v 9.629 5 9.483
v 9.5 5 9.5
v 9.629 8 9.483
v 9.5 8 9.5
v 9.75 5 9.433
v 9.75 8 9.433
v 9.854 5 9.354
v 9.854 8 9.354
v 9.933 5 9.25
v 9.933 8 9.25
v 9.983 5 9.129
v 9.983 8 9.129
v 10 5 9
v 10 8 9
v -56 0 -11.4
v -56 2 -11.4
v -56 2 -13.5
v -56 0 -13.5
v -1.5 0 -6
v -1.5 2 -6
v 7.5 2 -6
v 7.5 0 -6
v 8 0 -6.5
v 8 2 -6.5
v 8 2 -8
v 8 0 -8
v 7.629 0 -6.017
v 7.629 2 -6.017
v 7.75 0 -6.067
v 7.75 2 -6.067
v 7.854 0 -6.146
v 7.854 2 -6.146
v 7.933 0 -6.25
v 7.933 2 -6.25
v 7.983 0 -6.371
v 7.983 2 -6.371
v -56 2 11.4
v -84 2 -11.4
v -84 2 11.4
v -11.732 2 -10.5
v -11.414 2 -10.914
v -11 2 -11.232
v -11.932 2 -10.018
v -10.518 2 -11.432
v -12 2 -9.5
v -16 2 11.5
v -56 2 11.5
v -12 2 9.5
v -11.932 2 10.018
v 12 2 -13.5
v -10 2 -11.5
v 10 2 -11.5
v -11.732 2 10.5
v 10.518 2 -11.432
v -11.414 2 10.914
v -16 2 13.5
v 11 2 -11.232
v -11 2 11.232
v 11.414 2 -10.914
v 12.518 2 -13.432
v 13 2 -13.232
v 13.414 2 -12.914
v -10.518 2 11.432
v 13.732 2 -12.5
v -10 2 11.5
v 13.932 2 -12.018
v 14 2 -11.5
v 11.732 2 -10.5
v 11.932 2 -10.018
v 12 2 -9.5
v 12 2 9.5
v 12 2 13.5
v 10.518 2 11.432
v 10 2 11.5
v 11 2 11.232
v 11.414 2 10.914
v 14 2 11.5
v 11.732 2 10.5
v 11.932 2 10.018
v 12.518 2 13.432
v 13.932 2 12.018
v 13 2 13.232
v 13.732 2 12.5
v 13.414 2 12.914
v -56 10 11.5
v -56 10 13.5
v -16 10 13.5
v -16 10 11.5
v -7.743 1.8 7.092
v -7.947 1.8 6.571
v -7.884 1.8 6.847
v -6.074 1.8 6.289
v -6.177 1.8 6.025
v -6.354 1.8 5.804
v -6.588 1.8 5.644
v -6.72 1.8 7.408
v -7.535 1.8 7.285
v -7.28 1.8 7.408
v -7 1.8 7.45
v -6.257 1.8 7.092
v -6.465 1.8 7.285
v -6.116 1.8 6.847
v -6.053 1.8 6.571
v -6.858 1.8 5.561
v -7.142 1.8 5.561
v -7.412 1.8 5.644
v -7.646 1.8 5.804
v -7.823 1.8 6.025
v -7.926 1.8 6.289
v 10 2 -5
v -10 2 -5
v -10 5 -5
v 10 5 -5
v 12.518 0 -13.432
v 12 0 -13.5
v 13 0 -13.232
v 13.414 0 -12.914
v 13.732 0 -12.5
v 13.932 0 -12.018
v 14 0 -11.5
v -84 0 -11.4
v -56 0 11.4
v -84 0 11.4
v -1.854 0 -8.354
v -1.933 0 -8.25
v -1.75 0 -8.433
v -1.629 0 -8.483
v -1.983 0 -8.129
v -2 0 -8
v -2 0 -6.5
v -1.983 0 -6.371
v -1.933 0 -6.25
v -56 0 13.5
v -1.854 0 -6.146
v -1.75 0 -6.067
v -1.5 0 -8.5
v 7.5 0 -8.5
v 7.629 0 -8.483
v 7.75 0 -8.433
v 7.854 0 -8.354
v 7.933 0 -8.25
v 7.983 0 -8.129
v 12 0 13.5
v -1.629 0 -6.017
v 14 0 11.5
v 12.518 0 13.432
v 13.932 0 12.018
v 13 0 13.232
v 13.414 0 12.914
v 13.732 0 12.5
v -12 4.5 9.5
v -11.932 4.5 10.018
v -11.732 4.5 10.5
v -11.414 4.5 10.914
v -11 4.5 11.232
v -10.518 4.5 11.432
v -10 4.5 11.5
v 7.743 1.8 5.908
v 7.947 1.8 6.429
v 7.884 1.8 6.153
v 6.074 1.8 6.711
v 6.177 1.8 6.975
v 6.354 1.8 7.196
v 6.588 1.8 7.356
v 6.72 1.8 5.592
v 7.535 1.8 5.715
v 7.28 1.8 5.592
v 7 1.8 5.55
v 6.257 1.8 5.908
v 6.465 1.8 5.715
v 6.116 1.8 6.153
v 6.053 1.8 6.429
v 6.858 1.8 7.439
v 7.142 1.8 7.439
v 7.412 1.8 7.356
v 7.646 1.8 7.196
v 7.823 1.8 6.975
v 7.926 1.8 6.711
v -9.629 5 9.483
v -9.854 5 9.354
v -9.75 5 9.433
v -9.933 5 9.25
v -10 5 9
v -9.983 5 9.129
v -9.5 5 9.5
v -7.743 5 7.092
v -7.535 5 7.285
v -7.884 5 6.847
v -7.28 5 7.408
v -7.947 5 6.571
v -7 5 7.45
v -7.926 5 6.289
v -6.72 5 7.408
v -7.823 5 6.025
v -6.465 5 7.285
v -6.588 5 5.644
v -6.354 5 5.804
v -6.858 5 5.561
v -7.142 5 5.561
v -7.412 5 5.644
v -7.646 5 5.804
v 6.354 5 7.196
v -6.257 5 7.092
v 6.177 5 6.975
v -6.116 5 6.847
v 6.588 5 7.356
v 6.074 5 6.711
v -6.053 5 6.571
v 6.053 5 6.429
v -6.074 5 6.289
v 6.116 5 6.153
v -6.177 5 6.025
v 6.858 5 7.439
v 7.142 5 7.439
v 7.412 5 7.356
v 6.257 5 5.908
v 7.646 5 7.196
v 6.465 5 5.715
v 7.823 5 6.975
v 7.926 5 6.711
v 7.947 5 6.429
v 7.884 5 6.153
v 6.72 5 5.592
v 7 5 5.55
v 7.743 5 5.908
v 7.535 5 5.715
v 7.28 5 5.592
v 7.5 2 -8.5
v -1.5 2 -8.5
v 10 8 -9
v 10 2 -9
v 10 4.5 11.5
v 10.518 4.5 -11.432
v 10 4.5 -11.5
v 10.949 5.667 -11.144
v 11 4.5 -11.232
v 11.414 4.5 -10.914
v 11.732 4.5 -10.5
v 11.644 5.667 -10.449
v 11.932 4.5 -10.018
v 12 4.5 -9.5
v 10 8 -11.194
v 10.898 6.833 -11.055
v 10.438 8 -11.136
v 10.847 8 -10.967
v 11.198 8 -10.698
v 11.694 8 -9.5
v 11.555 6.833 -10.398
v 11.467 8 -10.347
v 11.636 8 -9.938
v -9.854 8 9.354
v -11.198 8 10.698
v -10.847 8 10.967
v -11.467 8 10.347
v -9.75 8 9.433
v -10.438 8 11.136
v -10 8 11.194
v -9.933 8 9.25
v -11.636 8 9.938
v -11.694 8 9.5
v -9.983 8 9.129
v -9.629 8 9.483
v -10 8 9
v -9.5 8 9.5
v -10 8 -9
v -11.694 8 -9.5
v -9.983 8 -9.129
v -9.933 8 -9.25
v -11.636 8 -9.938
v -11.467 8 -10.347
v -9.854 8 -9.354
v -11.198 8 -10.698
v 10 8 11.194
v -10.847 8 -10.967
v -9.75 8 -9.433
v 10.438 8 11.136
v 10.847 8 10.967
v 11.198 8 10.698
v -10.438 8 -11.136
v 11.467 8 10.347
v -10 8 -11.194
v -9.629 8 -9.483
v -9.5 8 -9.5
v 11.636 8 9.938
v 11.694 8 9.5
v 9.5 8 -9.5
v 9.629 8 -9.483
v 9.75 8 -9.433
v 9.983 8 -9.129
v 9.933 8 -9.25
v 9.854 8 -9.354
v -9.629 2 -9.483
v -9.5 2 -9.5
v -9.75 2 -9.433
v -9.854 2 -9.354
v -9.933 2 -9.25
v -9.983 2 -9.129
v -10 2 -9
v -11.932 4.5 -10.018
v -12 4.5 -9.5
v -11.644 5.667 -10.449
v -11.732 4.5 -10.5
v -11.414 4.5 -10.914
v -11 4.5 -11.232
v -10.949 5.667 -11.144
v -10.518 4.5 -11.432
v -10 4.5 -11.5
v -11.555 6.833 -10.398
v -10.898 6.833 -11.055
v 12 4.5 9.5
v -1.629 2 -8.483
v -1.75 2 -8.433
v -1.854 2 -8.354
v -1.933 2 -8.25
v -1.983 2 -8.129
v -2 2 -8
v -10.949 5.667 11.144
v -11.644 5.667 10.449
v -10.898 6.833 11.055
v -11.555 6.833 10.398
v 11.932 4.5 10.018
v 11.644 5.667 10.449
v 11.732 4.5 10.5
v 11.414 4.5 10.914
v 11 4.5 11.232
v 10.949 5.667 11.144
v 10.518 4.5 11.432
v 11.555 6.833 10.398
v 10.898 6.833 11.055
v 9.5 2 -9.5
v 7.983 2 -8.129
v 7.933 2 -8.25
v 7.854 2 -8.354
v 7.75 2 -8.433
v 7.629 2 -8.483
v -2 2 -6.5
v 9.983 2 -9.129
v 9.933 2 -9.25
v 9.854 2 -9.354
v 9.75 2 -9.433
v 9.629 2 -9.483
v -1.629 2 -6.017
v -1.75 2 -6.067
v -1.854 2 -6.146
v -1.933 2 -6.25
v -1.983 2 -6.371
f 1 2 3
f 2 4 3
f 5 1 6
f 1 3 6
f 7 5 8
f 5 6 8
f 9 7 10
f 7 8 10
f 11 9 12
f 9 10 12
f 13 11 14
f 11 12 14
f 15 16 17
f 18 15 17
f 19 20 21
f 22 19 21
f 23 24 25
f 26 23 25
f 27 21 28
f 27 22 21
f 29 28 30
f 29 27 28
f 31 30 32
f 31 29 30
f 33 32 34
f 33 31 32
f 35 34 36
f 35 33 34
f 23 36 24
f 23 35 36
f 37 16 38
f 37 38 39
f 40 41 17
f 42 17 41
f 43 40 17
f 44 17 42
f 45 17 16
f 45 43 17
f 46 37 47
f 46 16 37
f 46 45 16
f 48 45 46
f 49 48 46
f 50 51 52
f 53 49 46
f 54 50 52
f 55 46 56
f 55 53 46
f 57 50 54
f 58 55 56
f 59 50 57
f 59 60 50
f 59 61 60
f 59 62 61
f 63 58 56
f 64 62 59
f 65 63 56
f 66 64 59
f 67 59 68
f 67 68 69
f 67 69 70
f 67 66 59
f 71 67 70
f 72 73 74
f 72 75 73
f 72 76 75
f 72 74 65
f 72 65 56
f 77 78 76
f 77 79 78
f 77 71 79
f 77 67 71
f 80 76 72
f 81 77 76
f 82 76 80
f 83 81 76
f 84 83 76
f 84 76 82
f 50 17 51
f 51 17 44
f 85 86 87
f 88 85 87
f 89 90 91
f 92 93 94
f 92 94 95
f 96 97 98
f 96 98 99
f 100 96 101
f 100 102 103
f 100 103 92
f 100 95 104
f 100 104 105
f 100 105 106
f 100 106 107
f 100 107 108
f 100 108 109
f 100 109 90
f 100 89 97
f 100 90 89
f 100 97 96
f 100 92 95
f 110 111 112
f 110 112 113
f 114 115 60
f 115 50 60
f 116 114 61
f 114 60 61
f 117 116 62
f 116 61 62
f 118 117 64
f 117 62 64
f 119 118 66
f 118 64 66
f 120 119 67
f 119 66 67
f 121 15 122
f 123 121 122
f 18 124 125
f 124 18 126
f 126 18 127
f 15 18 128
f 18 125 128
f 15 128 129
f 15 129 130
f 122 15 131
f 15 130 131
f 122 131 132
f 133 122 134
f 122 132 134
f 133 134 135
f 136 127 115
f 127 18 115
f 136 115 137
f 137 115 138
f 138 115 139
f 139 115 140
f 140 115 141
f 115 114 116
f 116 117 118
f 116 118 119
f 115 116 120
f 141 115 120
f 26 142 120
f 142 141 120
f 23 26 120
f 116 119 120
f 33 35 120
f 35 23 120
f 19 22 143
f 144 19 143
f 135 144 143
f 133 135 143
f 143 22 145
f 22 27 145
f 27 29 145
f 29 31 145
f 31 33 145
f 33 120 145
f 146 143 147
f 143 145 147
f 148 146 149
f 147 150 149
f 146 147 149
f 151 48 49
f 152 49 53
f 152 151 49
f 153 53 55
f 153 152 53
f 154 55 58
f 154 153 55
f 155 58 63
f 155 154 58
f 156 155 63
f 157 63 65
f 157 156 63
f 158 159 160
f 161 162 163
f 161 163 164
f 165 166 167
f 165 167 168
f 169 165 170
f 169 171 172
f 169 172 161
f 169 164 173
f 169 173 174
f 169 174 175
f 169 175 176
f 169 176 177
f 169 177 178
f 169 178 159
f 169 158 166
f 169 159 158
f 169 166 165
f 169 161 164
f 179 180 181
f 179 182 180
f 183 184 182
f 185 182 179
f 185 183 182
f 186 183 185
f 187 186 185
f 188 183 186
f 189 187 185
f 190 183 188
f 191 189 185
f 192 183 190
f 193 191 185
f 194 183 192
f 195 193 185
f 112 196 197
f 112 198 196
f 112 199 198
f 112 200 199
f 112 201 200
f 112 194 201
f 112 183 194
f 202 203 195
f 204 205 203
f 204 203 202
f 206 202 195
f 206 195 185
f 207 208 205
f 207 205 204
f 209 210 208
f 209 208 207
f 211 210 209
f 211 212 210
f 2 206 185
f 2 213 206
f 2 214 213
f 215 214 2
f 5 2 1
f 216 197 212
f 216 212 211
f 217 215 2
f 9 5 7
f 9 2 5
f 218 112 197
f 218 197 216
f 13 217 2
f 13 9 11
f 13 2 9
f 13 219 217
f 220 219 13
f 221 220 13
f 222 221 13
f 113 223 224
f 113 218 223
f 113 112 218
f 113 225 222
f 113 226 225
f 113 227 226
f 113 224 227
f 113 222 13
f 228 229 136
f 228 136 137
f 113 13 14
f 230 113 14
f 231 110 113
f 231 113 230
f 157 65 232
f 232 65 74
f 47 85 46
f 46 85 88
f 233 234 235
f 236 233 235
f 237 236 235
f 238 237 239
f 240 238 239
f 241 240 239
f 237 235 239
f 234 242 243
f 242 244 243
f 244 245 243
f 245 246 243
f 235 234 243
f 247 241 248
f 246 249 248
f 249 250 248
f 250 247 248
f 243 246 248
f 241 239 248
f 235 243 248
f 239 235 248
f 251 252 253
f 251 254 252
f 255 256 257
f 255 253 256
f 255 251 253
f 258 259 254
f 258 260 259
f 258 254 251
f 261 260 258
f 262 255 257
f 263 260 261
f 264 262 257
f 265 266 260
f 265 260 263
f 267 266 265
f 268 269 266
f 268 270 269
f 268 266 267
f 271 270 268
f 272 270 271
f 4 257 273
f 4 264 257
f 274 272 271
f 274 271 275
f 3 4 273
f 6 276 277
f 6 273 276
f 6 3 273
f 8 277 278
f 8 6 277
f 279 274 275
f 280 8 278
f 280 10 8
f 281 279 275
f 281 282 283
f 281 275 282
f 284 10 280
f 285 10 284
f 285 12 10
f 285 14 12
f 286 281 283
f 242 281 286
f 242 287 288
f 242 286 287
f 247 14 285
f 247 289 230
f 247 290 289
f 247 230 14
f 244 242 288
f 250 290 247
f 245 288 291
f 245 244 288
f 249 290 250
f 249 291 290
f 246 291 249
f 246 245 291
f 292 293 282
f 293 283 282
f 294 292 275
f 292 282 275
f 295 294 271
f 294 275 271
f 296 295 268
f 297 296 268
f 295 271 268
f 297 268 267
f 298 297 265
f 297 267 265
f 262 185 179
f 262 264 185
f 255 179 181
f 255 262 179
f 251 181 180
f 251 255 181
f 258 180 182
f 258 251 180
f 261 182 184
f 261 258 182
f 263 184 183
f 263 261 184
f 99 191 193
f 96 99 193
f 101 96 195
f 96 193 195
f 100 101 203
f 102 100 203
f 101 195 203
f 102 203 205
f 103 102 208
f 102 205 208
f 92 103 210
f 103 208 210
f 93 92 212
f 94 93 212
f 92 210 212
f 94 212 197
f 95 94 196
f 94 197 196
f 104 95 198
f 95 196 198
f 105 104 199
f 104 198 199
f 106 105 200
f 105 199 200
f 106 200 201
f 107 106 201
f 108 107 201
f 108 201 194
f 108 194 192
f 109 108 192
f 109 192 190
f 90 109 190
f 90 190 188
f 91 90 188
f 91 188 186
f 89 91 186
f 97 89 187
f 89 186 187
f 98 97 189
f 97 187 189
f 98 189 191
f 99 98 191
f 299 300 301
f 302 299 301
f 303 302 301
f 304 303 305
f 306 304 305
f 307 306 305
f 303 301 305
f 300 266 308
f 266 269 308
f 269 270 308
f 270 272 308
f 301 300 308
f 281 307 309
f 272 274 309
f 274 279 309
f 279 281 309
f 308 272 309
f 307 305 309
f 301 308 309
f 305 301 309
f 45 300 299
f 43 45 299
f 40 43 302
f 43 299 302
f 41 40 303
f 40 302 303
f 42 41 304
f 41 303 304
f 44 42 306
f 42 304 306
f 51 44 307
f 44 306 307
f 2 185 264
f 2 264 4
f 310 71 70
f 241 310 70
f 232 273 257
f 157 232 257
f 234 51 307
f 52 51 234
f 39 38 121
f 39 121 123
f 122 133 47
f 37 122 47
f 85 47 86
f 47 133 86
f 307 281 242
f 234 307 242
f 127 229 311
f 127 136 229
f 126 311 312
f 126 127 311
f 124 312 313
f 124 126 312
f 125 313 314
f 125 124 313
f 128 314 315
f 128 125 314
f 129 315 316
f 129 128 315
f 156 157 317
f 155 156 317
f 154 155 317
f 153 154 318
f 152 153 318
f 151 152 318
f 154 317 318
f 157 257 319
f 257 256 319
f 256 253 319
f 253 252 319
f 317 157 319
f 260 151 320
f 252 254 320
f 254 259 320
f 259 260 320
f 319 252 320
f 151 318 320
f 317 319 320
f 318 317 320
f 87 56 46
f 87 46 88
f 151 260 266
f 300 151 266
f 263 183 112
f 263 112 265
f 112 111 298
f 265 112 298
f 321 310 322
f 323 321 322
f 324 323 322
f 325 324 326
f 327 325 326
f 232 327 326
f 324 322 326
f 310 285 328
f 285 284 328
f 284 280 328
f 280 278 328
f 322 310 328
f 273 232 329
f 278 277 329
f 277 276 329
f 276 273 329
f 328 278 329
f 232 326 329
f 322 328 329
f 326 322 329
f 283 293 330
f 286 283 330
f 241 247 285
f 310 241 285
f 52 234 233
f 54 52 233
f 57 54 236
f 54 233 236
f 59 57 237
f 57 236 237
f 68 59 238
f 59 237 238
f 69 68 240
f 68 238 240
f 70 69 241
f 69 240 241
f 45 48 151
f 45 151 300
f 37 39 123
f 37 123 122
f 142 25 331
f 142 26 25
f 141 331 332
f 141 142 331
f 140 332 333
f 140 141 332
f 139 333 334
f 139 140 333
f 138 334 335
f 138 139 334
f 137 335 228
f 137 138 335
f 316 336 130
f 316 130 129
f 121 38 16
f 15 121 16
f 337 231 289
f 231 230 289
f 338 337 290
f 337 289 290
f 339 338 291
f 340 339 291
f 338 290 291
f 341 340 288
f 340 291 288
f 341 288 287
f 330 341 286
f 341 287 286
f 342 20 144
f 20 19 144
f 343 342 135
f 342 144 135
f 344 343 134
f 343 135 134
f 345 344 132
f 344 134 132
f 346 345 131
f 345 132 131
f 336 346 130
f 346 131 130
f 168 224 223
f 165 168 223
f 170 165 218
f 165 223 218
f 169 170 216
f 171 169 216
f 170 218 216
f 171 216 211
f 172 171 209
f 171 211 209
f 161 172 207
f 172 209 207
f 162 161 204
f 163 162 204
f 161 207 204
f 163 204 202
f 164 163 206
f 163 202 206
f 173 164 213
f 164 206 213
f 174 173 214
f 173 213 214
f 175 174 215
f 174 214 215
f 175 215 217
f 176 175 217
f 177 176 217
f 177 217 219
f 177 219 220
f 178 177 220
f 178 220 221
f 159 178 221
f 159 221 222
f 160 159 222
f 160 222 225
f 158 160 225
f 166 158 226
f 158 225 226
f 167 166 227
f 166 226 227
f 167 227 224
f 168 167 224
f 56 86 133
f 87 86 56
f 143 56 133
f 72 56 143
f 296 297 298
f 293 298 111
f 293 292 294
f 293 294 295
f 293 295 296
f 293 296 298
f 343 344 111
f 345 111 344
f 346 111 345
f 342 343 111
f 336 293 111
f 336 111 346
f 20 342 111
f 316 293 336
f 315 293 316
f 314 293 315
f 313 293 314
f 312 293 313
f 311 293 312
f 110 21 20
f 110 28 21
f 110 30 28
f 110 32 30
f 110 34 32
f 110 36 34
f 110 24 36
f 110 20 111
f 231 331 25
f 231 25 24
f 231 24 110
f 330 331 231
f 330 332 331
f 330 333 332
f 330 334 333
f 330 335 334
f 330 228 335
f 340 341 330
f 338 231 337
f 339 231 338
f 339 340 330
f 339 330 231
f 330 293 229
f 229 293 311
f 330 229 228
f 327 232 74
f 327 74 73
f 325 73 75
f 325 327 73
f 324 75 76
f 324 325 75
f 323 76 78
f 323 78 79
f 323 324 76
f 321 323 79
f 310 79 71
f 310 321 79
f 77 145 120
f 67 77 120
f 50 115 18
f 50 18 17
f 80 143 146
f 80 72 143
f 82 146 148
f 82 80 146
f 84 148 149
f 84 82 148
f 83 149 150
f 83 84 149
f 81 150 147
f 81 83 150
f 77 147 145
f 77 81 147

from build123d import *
from OCP.BRepFilletAPI import BRepFilletAPI_MakeChamfer

# Parameters (mm, degrees)
SKETCH1_W           = 28
SKETCH1_H           = 27
BOSS_EXTRUDE1_DEPTH = 2
SKETCH2_W           = 10
SKETCH2_H           = 2.5
CUT_EXTRUDE1_DEPTH  = 2
SKETCH3_W           = 20
SKETCH3_H           = 14.5
BOSS_EXTRUDE2_DEPTH = 3
SKETCH4_W           = 24
SKETCH4_H           = 23
SKETCH4_W_2         = 20
SKETCH4_H_2         = 19
BOSS_EXTRUDE3_DEPTH = 6
SKETCH5_R           = 0.95
CUT_EXTRUDE2_DEPTH  = 3.2
FILLET3_R           = 2
FILLET2_R           = 0.5
SKETCH6_W           = 27
SKETCH6_H           = 2
BOSS_EXTRUDE4_DEPTH = 70
CHAMFER1_SIZE       = 3.5
CHAMFER1_SIZE2      = 0.306210322
SKETCH7_W           = 28
SKETCH7_H           = 2.1
CUT_EXTRUDE3_DEPTH  = 86.289213855
SKETCH8_W           = 40
SKETCH8_H           = 8
BOSS_EXTRUDE5_DEPTH = 2


with BuildPart() as part:
    # Sketch1 → Boss-Extrude1 (new body)
    with BuildSketch(Plane(origin=(0, 0, 0), x_dir=(1, 0, 0), z_dir=(0, 1, 0))):
        Rectangle(SKETCH1_W, SKETCH1_H)
    extrude(amount=BOSS_EXTRUDE1_DEPTH)

    # Sketch2 → Cut-Extrude1 (cut)
    with BuildSketch(Plane(origin=(0, 2, 0), x_dir=(1, 0, 0), z_dir=(0, 1, 0))):
        with Locations((3, 7.25)):
            Rectangle(SKETCH2_W, SKETCH2_H)
    extrude(amount=-CUT_EXTRUDE1_DEPTH, mode=Mode.SUBTRACT)

    # Sketch3 → Boss-Extrude2 (add)
    with BuildSketch(Plane(origin=(0, 2, 0), x_dir=(1, 0, 0), z_dir=(0, 1, 0))):
        with Locations((0, -2.25)):
            Rectangle(SKETCH3_W, SKETCH3_H)
    extrude(amount=BOSS_EXTRUDE2_DEPTH)

    # Sketch4 → Boss-Extrude3 (add)
    with BuildSketch(Plane(origin=(0, 2, 0), x_dir=(1, 0, 0), z_dir=(0, 1, 0))):
        Rectangle(SKETCH4_W, SKETCH4_H)
        Rectangle(SKETCH4_W_2, SKETCH4_H_2, mode=Mode.SUBTRACT)
    extrude(amount=BOSS_EXTRUDE3_DEPTH)

    # Sketch5 → Cut-Extrude2 (cut)
    with BuildSketch(Plane(origin=(0, 5, 0), x_dir=(1, 0, 0), z_dir=(0, 1, 0))):
        with Locations(Location((-7, -6.5, 0), (0, 0, 270))):
            Circle(SKETCH5_R)
        with Locations(Location((7, -6.5, 0), (0, 0, 90))):
            Circle(SKETCH5_R)
    extrude(amount=-CUT_EXTRUDE2_DEPTH, mode=Mode.SUBTRACT)

    # Fillet3
    fillet3_edges = [part.edges().sort_by_distance(p)[0] for p in [
        (12, 5, -11.5),
        (-12, 5, -11.5),
        (-12, 5, 11.5),
        (12, 5, 11.5),
        (14, 1, 13.5),
        (14, 1, -13.5),
    ]]
    fillet(fillet3_edges, radius=FILLET3_R)

    # Fillet2
    fillet2_edges = [part.edges().sort_by_distance(p)[0] for p in [
        (-2, 1, -8.5),
        (-2, 1, -6),
        (8, 1, -6),
        (8, 1, -8.5),
        (10, 5, -9.5),
        (-10, 6.5, 9.5),
        (10, 6.5, 9.5),
        (-10, 5, -9.5),
    ]]
    fillet(fillet2_edges, radius=FILLET2_R)

    # Sketch6 → Boss-Extrude4 (add)
    with BuildSketch(Plane.ZY.offset(14)):
        with Locations((0, 1)):
            Rectangle(SKETCH6_W, SKETCH6_H)
    extrude(amount=BOSS_EXTRUDE4_DEPTH)

    # Chamfer1: one chamfer whose edges measure the first distance from different faces: ONE call of the kernel's chamfer builder (chamfer() names one face for all edges)
    chamfer1_edges_1 = [part.edges().sort_by_distance(p)[0] for p in [
        (0, 8, -11.5),
    ]]
    chamfer1_side_1 = [part.faces().sort_by_distance(p)[0] for p in [
        (0, 5, -11.5),
    ]]
    chamfer1_edges_2 = [part.edges().sort_by_distance(p)[0] for p in [
        (12, 8, 0),
    ]]
    chamfer1_side_2 = [part.faces().sort_by_distance(p)[0] for p in [
        (12, 5, 0),
    ]]
    chamfer1_edges_3 = [part.edges().sort_by_distance(p)[0] for p in [
        (-12, 8, 0),
    ]]
    chamfer1_side_3 = [part.faces().sort_by_distance(p)[0] for p in [
        (-12, 5, 0),
    ]]
    chamfer1_edges_4 = [part.edges().sort_by_distance(p)[0] for p in [
        (0, 8, 11.5),
    ]]
    chamfer1_side_4 = [part.faces().sort_by_distance(p)[0] for p in [
        (0, 5, 11.5),
    ]]
    chamfer1_edges_5 = [part.edges().sort_by_distance(p)[0] for p in [
        (-11.414213562, 8, -10.914213562),
    ]]
    chamfer1_side_5 = [part.faces().sort_by_distance(p)[0] for p in [
        (-11.414213562, 5, -10.914213562),
    ]]
    chamfer1_edges_6 = [part.edges().sort_by_distance(p)[0] for p in [
        (-11.414213562, 8, 10.914213562),
    ]]
    chamfer1_side_6 = [part.faces().sort_by_distance(p)[0] for p in [
        (-11.414213562, 5, 10.914213562),
    ]]
    chamfer1_edges_7 = [part.edges().sort_by_distance(p)[0] for p in [
        (11.414213562, 8, 10.914213562),
    ]]
    chamfer1_side_7 = [part.faces().sort_by_distance(p)[0] for p in [
        (11.414213562, 5, 10.914213562),
    ]]
    chamfer1_edges_8 = [part.edges().sort_by_distance(p)[0] for p in [
        (11.414213562, 8, -10.914213562),
    ]]
    chamfer1_side_8 = [part.faces().sort_by_distance(p)[0] for p in [
        (11.414213562, 5, -10.914213562),
    ]]
    chamfer1 = BRepFilletAPI_MakeChamfer(part.part.solid().wrapped)
    for e in chamfer1_edges_1:
        chamfer1.Add(CHAMFER1_SIZE, CHAMFER1_SIZE2, e.wrapped, chamfer1_side_1[0].wrapped)  # the first distance lies on this face
    for e in chamfer1_edges_2:
        chamfer1.Add(CHAMFER1_SIZE, CHAMFER1_SIZE2, e.wrapped, chamfer1_side_2[0].wrapped)  # the first distance lies on this face
    for e in chamfer1_edges_3:
        chamfer1.Add(CHAMFER1_SIZE, CHAMFER1_SIZE2, e.wrapped, chamfer1_side_3[0].wrapped)  # the first distance lies on this face
    for e in chamfer1_edges_4:
        chamfer1.Add(CHAMFER1_SIZE, CHAMFER1_SIZE2, e.wrapped, chamfer1_side_4[0].wrapped)  # the first distance lies on this face
    for e in chamfer1_edges_5:
        chamfer1.Add(CHAMFER1_SIZE, CHAMFER1_SIZE2, e.wrapped, chamfer1_side_5[0].wrapped)  # the first distance lies on this face
    for e in chamfer1_edges_6:
        chamfer1.Add(CHAMFER1_SIZE, CHAMFER1_SIZE2, e.wrapped, chamfer1_side_6[0].wrapped)  # the first distance lies on this face
    for e in chamfer1_edges_7:
        chamfer1.Add(CHAMFER1_SIZE, CHAMFER1_SIZE2, e.wrapped, chamfer1_side_7[0].wrapped)  # the first distance lies on this face
    for e in chamfer1_edges_8:
        chamfer1.Add(CHAMFER1_SIZE, CHAMFER1_SIZE2, e.wrapped, chamfer1_side_8[0].wrapped)  # the first distance lies on this face
    add(Compound.cast(chamfer1.Shape()), mode=Mode.REPLACE)

    # Sketch7 → Cut-Extrude3 (cut, through all)
    with BuildSketch(Plane(origin=(0, 2, 0), x_dir=(1, 0, 0), z_dir=(0, 1, 0))):
        with Locations((-70, 12.45)):
            Rectangle(SKETCH7_W, SKETCH7_H)
    cut_extrude3 = extrude(amount=-CUT_EXTRUDE3_DEPTH, mode=Mode.SUBTRACT)

    # Mirror1: Cut-Extrude3 across plane
    add(cut_extrude3.mirror(Plane.XY), mode=Mode.SUBTRACT)

    # Sketch8 → Boss-Extrude5 (add)
    with BuildSketch(Plane.XY.offset(13.5)):
        with Locations((-36, 6)):
            Rectangle(SKETCH8_W, SKETCH8_H)
    extrude(amount=-BOSS_EXTRUDE5_DEPTH)


solid = part.part
